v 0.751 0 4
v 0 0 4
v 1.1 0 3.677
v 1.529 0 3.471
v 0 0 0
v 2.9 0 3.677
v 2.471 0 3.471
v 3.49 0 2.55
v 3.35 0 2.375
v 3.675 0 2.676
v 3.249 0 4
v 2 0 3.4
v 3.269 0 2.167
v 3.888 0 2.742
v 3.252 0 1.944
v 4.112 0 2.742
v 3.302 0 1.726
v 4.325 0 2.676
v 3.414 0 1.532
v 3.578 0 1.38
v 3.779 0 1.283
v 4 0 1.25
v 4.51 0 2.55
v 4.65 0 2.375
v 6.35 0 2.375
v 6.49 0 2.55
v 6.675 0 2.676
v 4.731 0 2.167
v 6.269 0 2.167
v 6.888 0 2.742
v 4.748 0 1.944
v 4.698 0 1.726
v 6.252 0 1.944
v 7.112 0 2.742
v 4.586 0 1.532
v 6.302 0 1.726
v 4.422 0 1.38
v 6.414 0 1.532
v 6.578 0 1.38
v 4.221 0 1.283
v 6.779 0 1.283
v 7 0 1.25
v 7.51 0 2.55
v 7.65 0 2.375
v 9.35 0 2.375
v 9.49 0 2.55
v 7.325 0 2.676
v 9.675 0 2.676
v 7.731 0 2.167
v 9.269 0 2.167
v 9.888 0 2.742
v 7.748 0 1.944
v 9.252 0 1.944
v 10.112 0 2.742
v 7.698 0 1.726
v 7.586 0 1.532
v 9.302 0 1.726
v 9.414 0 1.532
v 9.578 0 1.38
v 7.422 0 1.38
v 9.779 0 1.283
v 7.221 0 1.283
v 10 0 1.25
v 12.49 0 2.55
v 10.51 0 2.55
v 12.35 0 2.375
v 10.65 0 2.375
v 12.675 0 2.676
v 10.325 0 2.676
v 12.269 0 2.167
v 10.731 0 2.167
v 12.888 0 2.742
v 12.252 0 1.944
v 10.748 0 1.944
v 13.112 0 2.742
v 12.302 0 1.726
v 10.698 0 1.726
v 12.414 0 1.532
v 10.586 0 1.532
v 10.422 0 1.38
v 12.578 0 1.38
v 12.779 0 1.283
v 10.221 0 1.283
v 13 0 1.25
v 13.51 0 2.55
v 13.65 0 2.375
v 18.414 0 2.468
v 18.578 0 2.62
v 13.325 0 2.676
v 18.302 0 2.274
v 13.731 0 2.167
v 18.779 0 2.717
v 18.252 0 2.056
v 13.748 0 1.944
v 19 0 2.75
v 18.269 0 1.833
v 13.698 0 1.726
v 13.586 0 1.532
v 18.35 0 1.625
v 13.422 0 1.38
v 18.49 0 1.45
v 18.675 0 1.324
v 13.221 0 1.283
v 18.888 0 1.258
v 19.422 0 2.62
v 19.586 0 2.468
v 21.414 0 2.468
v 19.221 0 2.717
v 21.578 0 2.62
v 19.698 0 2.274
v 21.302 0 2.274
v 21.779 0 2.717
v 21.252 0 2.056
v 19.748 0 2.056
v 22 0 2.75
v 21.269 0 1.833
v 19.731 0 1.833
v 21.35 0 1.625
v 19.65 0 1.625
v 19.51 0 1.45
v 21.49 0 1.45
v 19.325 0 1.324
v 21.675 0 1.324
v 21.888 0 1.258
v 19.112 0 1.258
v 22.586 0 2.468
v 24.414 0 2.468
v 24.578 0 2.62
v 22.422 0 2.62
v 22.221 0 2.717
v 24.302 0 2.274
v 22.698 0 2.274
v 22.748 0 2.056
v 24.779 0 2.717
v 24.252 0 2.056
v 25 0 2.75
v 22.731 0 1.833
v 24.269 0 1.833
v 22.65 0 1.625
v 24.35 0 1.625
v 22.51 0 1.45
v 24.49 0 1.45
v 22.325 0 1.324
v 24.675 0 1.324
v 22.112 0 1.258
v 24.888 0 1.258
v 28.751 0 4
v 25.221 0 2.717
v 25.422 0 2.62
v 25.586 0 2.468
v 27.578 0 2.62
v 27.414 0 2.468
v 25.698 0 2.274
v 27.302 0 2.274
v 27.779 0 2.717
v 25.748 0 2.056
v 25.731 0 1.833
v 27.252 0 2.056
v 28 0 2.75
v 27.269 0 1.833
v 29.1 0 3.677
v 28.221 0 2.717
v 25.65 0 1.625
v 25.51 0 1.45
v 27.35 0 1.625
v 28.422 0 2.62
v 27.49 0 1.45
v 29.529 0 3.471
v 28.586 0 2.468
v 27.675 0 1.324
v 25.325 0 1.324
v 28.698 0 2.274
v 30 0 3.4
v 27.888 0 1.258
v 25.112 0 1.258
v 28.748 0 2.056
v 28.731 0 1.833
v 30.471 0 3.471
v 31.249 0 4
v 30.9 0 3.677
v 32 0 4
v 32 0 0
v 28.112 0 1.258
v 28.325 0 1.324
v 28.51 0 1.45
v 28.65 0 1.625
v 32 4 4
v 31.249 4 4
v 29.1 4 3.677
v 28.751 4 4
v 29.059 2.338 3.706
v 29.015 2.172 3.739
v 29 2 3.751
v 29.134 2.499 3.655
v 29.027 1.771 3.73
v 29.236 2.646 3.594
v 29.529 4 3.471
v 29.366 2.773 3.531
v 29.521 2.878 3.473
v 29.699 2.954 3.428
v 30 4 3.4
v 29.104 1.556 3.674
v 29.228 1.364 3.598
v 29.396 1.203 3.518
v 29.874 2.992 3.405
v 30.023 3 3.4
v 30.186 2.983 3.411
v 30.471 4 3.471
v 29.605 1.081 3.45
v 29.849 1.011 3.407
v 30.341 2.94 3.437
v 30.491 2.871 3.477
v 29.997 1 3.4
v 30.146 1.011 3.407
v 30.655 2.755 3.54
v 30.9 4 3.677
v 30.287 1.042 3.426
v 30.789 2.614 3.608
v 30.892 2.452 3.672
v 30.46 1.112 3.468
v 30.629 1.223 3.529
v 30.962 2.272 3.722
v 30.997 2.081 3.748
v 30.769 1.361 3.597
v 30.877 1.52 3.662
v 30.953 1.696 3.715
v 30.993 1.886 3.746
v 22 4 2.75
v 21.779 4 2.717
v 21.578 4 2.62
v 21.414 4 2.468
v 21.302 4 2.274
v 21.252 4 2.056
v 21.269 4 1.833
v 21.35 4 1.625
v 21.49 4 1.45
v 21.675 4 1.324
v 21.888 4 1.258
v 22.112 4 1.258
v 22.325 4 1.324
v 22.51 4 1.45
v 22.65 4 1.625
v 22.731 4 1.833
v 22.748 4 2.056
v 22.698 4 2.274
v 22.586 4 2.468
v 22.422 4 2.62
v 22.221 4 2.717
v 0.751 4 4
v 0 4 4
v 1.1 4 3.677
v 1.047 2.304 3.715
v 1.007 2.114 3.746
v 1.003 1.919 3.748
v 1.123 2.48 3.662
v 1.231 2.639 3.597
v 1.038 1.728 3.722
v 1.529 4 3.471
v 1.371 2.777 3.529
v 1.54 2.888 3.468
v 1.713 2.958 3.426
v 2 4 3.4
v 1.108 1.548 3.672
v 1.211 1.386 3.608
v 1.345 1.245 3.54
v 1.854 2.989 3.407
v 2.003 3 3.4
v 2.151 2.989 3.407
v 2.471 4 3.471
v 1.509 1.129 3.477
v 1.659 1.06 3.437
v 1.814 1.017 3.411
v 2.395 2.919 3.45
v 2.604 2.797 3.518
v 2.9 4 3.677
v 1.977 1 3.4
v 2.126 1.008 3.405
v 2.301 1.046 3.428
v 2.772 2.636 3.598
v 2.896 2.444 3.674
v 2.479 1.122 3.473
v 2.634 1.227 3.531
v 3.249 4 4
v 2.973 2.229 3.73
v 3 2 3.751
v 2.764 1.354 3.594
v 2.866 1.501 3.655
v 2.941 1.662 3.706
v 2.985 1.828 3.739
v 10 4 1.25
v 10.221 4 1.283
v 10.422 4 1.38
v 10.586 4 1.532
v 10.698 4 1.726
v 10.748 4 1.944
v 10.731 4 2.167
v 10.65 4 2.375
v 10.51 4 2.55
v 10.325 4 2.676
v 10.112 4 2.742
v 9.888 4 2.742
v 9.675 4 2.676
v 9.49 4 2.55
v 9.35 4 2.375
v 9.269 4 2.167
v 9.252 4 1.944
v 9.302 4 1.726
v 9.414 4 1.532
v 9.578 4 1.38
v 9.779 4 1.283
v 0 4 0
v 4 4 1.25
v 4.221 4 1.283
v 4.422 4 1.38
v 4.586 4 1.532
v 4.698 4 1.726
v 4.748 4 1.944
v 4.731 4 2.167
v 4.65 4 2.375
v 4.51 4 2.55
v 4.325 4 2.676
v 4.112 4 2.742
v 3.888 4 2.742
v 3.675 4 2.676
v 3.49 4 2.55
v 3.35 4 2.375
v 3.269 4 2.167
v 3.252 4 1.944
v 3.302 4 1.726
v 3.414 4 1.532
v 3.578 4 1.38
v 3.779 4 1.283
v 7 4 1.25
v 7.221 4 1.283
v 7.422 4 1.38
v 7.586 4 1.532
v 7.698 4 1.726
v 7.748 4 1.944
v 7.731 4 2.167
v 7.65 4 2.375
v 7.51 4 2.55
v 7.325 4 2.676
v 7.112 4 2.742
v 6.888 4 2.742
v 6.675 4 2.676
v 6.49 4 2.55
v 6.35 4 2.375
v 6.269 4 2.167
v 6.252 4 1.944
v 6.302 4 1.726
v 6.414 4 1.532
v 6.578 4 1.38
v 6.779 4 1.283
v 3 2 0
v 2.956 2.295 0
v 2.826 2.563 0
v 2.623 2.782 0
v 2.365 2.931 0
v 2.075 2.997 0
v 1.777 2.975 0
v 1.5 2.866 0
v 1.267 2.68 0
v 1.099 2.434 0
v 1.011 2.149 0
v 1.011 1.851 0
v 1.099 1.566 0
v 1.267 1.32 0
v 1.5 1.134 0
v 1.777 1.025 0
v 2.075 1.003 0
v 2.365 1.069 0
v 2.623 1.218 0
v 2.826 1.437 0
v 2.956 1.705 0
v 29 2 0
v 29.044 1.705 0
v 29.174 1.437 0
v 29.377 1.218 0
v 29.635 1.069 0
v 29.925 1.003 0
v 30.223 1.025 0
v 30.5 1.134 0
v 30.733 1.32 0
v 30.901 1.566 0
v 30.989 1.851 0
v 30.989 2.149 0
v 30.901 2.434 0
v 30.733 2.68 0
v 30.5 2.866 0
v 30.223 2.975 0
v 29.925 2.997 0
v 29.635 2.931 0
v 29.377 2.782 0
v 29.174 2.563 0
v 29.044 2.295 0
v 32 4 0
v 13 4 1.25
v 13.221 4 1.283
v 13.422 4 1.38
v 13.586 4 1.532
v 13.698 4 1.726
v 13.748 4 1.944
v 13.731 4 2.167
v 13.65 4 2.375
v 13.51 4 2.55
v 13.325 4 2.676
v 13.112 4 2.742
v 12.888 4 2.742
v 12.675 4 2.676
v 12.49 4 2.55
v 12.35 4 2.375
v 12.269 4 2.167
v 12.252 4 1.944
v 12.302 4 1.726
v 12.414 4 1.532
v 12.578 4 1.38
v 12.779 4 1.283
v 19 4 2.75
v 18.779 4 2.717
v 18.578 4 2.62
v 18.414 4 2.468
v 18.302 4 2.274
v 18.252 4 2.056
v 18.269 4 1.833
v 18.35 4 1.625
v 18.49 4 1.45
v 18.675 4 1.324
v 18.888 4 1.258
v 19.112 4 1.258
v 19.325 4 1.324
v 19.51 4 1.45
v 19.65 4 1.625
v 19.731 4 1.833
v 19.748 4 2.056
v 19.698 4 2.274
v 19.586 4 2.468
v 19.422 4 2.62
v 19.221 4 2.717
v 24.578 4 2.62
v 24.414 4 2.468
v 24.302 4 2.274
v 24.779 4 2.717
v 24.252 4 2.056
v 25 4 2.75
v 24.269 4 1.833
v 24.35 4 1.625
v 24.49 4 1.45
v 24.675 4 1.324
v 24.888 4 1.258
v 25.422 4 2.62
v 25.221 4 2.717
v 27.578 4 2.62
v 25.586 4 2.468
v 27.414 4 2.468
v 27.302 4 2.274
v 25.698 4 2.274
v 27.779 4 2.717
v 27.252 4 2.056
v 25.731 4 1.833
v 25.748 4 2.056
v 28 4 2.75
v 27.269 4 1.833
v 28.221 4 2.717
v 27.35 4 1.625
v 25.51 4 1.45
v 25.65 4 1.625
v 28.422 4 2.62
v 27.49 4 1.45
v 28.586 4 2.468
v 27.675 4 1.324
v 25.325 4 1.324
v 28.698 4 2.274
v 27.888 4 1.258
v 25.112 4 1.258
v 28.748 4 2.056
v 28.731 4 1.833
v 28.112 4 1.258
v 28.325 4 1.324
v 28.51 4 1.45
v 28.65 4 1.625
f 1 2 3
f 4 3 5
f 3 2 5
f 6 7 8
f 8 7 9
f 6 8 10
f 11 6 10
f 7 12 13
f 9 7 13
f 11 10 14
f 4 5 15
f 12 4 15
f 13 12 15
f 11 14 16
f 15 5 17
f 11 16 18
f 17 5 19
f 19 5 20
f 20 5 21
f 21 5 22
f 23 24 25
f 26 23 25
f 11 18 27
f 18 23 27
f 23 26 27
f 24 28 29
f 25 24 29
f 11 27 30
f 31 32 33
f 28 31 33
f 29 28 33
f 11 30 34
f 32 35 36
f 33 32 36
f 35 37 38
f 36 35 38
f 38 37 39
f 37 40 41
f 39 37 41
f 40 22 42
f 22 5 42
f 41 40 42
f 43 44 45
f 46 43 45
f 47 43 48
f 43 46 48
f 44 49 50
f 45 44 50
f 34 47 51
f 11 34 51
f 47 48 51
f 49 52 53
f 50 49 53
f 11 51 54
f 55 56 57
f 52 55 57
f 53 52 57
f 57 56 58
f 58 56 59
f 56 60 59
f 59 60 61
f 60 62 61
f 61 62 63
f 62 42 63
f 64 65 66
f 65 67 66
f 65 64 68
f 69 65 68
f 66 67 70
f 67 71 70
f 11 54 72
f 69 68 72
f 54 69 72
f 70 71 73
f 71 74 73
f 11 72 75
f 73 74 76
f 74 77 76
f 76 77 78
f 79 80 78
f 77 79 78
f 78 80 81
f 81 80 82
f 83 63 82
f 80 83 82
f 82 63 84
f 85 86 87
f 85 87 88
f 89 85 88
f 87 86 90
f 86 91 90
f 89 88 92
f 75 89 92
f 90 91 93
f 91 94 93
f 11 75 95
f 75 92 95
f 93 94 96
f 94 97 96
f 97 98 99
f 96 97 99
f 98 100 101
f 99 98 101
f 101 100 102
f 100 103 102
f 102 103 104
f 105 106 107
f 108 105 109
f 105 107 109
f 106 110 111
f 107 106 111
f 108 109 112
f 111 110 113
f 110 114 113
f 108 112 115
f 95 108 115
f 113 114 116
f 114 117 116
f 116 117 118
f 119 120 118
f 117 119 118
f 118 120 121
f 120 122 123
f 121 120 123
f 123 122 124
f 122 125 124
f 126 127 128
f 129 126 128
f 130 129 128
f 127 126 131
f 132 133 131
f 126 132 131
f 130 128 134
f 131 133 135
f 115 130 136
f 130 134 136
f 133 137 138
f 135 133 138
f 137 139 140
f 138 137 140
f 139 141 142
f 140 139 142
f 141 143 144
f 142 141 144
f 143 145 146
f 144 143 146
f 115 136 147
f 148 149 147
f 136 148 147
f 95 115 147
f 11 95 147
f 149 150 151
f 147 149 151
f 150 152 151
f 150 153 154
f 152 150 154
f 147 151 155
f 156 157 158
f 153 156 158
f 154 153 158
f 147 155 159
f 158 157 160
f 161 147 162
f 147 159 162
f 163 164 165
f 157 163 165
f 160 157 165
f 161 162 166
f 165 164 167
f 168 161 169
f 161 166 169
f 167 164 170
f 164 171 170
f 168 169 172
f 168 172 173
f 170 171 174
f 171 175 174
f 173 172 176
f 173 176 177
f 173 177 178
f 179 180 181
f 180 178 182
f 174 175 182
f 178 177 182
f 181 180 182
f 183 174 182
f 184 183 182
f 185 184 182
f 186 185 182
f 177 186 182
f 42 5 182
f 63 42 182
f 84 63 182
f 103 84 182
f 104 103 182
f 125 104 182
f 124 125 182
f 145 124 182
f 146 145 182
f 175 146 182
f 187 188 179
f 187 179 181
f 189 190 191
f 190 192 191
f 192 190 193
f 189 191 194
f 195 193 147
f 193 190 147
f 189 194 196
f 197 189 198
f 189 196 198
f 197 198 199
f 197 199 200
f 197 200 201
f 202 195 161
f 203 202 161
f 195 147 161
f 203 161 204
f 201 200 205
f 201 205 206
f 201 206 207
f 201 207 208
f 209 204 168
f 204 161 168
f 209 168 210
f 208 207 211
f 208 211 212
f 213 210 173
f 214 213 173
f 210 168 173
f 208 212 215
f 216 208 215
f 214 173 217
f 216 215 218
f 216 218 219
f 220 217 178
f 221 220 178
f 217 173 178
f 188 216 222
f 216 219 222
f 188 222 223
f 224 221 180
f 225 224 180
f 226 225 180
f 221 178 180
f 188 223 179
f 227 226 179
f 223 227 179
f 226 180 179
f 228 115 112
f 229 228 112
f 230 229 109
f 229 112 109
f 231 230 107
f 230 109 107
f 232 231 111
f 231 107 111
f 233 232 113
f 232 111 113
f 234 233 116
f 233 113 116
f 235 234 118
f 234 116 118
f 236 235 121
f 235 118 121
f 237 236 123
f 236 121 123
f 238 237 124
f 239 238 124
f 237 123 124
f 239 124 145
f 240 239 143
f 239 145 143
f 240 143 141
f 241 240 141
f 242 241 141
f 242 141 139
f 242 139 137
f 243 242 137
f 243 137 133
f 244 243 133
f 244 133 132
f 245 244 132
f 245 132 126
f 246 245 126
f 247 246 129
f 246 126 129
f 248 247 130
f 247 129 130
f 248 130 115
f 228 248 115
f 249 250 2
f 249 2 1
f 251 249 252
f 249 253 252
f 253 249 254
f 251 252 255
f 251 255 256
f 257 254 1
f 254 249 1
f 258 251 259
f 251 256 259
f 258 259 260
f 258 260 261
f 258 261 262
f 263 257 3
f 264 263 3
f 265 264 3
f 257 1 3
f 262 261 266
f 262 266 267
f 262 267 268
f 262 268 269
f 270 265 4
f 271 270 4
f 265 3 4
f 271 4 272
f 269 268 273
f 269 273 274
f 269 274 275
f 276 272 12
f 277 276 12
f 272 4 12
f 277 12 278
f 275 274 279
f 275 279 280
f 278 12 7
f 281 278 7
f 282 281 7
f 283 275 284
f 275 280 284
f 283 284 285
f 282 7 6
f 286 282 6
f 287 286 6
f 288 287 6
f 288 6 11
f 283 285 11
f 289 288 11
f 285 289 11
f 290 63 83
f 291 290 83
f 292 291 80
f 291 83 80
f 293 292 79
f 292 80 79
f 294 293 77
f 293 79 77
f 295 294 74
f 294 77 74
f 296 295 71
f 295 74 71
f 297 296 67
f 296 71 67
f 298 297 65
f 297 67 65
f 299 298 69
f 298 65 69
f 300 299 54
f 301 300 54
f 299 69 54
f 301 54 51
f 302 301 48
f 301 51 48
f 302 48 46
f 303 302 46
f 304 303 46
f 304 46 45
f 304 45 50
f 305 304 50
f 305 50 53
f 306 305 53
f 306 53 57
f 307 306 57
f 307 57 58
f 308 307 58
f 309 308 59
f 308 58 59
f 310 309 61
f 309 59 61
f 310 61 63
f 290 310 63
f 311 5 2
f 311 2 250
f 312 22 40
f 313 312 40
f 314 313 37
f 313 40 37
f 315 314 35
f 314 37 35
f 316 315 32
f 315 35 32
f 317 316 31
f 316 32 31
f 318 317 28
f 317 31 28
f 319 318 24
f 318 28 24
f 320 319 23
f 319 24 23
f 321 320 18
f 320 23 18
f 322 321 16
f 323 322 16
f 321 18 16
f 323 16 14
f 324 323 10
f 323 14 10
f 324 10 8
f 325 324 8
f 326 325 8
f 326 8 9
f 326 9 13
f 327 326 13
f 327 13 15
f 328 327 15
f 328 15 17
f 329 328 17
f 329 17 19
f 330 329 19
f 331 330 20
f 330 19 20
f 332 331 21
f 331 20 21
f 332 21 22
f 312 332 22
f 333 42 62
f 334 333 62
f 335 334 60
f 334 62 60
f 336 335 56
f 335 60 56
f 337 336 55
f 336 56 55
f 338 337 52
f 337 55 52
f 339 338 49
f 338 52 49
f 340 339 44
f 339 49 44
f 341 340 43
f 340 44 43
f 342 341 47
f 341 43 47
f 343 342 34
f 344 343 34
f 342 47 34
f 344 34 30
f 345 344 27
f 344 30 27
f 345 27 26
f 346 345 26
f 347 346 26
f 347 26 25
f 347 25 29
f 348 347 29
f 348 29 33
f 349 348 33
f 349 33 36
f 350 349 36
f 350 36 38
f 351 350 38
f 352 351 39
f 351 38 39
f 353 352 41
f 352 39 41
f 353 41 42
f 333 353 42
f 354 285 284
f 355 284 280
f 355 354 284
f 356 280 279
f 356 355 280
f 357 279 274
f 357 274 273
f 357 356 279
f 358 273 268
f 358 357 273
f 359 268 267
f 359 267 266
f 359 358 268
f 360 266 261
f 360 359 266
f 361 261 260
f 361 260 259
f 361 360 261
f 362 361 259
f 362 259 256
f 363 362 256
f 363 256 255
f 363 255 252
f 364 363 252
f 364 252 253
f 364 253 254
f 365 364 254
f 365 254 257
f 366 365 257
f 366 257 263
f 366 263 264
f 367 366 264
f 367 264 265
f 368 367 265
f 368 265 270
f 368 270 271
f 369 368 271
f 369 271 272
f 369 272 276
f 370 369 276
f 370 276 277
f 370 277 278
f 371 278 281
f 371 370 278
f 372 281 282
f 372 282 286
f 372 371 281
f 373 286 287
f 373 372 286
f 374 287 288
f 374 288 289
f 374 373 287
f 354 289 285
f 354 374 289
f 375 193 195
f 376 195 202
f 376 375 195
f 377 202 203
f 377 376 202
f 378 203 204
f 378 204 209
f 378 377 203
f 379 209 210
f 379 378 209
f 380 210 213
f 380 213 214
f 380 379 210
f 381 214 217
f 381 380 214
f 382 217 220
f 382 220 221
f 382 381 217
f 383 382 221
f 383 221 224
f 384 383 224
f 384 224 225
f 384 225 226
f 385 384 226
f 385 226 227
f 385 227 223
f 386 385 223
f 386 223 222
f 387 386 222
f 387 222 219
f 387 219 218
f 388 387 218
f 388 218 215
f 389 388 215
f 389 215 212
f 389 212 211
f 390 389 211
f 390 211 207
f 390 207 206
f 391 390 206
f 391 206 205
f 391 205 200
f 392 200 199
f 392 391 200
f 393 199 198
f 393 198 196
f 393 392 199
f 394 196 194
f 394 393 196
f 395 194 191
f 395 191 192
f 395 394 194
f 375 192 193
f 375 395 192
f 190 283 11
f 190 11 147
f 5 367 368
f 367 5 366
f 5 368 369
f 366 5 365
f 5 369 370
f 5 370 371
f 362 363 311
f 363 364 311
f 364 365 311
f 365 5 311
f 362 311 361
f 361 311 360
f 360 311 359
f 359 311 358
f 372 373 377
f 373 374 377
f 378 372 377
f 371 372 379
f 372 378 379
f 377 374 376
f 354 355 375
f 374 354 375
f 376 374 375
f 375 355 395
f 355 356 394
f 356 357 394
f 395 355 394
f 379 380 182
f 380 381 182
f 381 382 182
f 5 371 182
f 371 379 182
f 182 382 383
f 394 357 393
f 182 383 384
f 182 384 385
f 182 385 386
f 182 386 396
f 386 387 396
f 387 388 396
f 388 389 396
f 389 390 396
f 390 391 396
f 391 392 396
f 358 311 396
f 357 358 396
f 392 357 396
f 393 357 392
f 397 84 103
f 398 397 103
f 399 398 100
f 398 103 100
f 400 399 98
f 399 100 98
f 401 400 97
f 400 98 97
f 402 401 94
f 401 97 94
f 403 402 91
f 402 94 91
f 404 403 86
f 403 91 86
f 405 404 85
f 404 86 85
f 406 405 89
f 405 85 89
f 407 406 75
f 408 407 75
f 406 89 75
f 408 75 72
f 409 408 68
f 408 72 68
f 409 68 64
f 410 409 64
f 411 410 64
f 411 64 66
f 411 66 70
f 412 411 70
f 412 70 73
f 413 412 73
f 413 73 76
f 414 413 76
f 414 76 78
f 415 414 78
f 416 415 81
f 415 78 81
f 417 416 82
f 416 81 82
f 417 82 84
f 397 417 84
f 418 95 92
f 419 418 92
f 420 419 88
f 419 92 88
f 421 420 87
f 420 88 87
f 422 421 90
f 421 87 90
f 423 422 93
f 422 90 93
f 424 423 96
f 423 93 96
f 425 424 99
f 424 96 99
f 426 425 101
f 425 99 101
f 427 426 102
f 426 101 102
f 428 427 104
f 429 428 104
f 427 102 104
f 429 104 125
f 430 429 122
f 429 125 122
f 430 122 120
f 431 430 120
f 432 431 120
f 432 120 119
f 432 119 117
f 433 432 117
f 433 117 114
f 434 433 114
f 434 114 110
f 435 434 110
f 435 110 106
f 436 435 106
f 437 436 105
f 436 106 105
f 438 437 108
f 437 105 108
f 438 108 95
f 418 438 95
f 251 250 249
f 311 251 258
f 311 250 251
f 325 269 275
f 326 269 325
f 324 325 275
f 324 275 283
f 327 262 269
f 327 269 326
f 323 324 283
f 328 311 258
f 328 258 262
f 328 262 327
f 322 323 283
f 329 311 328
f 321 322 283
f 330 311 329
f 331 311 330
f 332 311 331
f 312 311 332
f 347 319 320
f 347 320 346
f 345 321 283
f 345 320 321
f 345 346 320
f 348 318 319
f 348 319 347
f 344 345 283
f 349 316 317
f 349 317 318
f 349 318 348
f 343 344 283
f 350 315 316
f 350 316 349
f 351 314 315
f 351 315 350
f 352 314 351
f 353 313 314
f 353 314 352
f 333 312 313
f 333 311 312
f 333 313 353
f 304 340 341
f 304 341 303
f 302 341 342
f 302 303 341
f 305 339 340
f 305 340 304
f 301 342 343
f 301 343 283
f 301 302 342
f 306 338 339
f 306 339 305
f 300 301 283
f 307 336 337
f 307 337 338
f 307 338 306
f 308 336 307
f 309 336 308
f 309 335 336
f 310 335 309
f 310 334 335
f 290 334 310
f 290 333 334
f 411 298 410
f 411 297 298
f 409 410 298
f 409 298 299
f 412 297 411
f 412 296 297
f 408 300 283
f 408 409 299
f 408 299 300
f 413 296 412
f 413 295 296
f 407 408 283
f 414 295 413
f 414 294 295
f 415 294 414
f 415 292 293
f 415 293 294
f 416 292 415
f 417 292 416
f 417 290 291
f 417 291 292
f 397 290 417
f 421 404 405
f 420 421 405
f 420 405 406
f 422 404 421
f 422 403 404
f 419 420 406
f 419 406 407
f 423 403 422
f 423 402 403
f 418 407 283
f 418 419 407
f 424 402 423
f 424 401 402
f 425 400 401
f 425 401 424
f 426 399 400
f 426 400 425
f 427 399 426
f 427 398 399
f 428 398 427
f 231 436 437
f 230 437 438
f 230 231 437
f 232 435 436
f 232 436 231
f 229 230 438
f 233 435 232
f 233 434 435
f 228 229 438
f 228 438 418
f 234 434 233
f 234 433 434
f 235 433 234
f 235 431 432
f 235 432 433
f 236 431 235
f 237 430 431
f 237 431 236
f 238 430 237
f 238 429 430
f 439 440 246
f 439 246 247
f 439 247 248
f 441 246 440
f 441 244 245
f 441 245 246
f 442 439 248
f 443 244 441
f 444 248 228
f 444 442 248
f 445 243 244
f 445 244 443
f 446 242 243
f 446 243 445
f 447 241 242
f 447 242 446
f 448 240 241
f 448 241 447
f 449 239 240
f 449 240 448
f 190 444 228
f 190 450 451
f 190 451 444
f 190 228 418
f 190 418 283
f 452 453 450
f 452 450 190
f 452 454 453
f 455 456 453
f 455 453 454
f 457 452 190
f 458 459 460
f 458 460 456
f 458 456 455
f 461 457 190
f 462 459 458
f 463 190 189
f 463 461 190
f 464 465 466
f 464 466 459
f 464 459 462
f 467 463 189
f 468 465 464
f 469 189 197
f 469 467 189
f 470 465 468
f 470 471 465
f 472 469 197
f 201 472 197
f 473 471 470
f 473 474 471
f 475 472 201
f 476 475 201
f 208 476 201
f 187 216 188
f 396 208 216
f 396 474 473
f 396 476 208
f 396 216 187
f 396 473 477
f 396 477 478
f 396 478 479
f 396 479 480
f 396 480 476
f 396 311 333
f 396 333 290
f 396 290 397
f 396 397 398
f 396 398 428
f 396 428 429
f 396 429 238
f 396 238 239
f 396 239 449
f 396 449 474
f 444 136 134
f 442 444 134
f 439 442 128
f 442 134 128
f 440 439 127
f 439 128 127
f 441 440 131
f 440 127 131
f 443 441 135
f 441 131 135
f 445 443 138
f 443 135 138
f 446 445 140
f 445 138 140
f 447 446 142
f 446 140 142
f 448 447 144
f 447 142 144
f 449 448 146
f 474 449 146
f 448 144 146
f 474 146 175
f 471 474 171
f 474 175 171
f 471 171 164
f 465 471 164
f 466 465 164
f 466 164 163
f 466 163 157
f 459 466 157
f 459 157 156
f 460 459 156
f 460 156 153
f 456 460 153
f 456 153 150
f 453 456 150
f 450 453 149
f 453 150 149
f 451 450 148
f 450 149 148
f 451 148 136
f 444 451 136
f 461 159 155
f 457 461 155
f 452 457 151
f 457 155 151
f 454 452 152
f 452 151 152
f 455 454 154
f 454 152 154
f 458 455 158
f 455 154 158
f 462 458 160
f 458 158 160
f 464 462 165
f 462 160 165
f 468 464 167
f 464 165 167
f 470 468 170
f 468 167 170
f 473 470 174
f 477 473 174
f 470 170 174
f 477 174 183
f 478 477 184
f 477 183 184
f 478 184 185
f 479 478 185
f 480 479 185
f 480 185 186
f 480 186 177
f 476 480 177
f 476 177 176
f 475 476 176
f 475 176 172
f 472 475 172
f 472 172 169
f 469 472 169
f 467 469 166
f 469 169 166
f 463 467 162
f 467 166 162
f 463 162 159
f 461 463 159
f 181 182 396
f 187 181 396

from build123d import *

# Parameters (mm, degrees)
CROQUIS1_W              = 32
CROQUIS1_H              = 4
CROQUIS1_R              = 1
SALIENTE_EXTRUIR1_DEPTH = 4
CROQUIS2_R              = 1.6
CROQUIS2_R_2            = 0.75
CORTAR_EXTRUIR1_DEPTH   = 4


with BuildPart() as part:
    # Croquis1 → Saliente-Extruir1 (new body)
    with BuildSketch(Plane.XY):
        with Locations((16, 2)):
            Rectangle(CROQUIS1_W, CROQUIS1_H)
        with Locations((2, 2)):
            Circle(CROQUIS1_R, mode=Mode.SUBTRACT)
        with Locations(Location((30, 2, 0), (0, 0, 180))):
            Circle(CROQUIS1_R, mode=Mode.SUBTRACT)
    extrude(amount=SALIENTE_EXTRUIR1_DEPTH)

    # Croquis2 → Cortar-Extruir1 (cut)
    with BuildSketch(Plane.XZ):
        with Locations((2, 5)):
            Circle(CROQUIS2_R)
        with Locations(Location((13, 2, 0), (0, 0, 270))):
            Circle(CROQUIS2_R_2)
        with Locations(Location((10, 2, 0), (0, 0, 270))):
            Circle(CROQUIS2_R_2)
        with Locations(Location((7, 2, 0), (0, 0, 270))):
            Circle(CROQUIS2_R_2)
        with Locations(Location((25, 2, 0), (0, 0, 90))):
            Circle(CROQUIS2_R_2)
        with Locations(Location((22, 2, 0), (0, 0, 90))):
            Circle(CROQUIS2_R_2)
        with Locations(Location((19, 2, 0), (0, 0, 90))):
            Circle(CROQUIS2_R_2)
        with Locations((30, 5)):
            Circle(CROQUIS2_R)
        with Locations(Location((28, 2, 0), (0, 0, 90))):
            Circle(CROQUIS2_R_2)
        with Locations(Location((4, 2, 0), (0, 0, 270))):
            Circle(CROQUIS2_R_2)
    extrude(amount=-CORTAR_EXTRUIR1_DEPTH, mode=Mode.SUBTRACT)


solid = part.part
